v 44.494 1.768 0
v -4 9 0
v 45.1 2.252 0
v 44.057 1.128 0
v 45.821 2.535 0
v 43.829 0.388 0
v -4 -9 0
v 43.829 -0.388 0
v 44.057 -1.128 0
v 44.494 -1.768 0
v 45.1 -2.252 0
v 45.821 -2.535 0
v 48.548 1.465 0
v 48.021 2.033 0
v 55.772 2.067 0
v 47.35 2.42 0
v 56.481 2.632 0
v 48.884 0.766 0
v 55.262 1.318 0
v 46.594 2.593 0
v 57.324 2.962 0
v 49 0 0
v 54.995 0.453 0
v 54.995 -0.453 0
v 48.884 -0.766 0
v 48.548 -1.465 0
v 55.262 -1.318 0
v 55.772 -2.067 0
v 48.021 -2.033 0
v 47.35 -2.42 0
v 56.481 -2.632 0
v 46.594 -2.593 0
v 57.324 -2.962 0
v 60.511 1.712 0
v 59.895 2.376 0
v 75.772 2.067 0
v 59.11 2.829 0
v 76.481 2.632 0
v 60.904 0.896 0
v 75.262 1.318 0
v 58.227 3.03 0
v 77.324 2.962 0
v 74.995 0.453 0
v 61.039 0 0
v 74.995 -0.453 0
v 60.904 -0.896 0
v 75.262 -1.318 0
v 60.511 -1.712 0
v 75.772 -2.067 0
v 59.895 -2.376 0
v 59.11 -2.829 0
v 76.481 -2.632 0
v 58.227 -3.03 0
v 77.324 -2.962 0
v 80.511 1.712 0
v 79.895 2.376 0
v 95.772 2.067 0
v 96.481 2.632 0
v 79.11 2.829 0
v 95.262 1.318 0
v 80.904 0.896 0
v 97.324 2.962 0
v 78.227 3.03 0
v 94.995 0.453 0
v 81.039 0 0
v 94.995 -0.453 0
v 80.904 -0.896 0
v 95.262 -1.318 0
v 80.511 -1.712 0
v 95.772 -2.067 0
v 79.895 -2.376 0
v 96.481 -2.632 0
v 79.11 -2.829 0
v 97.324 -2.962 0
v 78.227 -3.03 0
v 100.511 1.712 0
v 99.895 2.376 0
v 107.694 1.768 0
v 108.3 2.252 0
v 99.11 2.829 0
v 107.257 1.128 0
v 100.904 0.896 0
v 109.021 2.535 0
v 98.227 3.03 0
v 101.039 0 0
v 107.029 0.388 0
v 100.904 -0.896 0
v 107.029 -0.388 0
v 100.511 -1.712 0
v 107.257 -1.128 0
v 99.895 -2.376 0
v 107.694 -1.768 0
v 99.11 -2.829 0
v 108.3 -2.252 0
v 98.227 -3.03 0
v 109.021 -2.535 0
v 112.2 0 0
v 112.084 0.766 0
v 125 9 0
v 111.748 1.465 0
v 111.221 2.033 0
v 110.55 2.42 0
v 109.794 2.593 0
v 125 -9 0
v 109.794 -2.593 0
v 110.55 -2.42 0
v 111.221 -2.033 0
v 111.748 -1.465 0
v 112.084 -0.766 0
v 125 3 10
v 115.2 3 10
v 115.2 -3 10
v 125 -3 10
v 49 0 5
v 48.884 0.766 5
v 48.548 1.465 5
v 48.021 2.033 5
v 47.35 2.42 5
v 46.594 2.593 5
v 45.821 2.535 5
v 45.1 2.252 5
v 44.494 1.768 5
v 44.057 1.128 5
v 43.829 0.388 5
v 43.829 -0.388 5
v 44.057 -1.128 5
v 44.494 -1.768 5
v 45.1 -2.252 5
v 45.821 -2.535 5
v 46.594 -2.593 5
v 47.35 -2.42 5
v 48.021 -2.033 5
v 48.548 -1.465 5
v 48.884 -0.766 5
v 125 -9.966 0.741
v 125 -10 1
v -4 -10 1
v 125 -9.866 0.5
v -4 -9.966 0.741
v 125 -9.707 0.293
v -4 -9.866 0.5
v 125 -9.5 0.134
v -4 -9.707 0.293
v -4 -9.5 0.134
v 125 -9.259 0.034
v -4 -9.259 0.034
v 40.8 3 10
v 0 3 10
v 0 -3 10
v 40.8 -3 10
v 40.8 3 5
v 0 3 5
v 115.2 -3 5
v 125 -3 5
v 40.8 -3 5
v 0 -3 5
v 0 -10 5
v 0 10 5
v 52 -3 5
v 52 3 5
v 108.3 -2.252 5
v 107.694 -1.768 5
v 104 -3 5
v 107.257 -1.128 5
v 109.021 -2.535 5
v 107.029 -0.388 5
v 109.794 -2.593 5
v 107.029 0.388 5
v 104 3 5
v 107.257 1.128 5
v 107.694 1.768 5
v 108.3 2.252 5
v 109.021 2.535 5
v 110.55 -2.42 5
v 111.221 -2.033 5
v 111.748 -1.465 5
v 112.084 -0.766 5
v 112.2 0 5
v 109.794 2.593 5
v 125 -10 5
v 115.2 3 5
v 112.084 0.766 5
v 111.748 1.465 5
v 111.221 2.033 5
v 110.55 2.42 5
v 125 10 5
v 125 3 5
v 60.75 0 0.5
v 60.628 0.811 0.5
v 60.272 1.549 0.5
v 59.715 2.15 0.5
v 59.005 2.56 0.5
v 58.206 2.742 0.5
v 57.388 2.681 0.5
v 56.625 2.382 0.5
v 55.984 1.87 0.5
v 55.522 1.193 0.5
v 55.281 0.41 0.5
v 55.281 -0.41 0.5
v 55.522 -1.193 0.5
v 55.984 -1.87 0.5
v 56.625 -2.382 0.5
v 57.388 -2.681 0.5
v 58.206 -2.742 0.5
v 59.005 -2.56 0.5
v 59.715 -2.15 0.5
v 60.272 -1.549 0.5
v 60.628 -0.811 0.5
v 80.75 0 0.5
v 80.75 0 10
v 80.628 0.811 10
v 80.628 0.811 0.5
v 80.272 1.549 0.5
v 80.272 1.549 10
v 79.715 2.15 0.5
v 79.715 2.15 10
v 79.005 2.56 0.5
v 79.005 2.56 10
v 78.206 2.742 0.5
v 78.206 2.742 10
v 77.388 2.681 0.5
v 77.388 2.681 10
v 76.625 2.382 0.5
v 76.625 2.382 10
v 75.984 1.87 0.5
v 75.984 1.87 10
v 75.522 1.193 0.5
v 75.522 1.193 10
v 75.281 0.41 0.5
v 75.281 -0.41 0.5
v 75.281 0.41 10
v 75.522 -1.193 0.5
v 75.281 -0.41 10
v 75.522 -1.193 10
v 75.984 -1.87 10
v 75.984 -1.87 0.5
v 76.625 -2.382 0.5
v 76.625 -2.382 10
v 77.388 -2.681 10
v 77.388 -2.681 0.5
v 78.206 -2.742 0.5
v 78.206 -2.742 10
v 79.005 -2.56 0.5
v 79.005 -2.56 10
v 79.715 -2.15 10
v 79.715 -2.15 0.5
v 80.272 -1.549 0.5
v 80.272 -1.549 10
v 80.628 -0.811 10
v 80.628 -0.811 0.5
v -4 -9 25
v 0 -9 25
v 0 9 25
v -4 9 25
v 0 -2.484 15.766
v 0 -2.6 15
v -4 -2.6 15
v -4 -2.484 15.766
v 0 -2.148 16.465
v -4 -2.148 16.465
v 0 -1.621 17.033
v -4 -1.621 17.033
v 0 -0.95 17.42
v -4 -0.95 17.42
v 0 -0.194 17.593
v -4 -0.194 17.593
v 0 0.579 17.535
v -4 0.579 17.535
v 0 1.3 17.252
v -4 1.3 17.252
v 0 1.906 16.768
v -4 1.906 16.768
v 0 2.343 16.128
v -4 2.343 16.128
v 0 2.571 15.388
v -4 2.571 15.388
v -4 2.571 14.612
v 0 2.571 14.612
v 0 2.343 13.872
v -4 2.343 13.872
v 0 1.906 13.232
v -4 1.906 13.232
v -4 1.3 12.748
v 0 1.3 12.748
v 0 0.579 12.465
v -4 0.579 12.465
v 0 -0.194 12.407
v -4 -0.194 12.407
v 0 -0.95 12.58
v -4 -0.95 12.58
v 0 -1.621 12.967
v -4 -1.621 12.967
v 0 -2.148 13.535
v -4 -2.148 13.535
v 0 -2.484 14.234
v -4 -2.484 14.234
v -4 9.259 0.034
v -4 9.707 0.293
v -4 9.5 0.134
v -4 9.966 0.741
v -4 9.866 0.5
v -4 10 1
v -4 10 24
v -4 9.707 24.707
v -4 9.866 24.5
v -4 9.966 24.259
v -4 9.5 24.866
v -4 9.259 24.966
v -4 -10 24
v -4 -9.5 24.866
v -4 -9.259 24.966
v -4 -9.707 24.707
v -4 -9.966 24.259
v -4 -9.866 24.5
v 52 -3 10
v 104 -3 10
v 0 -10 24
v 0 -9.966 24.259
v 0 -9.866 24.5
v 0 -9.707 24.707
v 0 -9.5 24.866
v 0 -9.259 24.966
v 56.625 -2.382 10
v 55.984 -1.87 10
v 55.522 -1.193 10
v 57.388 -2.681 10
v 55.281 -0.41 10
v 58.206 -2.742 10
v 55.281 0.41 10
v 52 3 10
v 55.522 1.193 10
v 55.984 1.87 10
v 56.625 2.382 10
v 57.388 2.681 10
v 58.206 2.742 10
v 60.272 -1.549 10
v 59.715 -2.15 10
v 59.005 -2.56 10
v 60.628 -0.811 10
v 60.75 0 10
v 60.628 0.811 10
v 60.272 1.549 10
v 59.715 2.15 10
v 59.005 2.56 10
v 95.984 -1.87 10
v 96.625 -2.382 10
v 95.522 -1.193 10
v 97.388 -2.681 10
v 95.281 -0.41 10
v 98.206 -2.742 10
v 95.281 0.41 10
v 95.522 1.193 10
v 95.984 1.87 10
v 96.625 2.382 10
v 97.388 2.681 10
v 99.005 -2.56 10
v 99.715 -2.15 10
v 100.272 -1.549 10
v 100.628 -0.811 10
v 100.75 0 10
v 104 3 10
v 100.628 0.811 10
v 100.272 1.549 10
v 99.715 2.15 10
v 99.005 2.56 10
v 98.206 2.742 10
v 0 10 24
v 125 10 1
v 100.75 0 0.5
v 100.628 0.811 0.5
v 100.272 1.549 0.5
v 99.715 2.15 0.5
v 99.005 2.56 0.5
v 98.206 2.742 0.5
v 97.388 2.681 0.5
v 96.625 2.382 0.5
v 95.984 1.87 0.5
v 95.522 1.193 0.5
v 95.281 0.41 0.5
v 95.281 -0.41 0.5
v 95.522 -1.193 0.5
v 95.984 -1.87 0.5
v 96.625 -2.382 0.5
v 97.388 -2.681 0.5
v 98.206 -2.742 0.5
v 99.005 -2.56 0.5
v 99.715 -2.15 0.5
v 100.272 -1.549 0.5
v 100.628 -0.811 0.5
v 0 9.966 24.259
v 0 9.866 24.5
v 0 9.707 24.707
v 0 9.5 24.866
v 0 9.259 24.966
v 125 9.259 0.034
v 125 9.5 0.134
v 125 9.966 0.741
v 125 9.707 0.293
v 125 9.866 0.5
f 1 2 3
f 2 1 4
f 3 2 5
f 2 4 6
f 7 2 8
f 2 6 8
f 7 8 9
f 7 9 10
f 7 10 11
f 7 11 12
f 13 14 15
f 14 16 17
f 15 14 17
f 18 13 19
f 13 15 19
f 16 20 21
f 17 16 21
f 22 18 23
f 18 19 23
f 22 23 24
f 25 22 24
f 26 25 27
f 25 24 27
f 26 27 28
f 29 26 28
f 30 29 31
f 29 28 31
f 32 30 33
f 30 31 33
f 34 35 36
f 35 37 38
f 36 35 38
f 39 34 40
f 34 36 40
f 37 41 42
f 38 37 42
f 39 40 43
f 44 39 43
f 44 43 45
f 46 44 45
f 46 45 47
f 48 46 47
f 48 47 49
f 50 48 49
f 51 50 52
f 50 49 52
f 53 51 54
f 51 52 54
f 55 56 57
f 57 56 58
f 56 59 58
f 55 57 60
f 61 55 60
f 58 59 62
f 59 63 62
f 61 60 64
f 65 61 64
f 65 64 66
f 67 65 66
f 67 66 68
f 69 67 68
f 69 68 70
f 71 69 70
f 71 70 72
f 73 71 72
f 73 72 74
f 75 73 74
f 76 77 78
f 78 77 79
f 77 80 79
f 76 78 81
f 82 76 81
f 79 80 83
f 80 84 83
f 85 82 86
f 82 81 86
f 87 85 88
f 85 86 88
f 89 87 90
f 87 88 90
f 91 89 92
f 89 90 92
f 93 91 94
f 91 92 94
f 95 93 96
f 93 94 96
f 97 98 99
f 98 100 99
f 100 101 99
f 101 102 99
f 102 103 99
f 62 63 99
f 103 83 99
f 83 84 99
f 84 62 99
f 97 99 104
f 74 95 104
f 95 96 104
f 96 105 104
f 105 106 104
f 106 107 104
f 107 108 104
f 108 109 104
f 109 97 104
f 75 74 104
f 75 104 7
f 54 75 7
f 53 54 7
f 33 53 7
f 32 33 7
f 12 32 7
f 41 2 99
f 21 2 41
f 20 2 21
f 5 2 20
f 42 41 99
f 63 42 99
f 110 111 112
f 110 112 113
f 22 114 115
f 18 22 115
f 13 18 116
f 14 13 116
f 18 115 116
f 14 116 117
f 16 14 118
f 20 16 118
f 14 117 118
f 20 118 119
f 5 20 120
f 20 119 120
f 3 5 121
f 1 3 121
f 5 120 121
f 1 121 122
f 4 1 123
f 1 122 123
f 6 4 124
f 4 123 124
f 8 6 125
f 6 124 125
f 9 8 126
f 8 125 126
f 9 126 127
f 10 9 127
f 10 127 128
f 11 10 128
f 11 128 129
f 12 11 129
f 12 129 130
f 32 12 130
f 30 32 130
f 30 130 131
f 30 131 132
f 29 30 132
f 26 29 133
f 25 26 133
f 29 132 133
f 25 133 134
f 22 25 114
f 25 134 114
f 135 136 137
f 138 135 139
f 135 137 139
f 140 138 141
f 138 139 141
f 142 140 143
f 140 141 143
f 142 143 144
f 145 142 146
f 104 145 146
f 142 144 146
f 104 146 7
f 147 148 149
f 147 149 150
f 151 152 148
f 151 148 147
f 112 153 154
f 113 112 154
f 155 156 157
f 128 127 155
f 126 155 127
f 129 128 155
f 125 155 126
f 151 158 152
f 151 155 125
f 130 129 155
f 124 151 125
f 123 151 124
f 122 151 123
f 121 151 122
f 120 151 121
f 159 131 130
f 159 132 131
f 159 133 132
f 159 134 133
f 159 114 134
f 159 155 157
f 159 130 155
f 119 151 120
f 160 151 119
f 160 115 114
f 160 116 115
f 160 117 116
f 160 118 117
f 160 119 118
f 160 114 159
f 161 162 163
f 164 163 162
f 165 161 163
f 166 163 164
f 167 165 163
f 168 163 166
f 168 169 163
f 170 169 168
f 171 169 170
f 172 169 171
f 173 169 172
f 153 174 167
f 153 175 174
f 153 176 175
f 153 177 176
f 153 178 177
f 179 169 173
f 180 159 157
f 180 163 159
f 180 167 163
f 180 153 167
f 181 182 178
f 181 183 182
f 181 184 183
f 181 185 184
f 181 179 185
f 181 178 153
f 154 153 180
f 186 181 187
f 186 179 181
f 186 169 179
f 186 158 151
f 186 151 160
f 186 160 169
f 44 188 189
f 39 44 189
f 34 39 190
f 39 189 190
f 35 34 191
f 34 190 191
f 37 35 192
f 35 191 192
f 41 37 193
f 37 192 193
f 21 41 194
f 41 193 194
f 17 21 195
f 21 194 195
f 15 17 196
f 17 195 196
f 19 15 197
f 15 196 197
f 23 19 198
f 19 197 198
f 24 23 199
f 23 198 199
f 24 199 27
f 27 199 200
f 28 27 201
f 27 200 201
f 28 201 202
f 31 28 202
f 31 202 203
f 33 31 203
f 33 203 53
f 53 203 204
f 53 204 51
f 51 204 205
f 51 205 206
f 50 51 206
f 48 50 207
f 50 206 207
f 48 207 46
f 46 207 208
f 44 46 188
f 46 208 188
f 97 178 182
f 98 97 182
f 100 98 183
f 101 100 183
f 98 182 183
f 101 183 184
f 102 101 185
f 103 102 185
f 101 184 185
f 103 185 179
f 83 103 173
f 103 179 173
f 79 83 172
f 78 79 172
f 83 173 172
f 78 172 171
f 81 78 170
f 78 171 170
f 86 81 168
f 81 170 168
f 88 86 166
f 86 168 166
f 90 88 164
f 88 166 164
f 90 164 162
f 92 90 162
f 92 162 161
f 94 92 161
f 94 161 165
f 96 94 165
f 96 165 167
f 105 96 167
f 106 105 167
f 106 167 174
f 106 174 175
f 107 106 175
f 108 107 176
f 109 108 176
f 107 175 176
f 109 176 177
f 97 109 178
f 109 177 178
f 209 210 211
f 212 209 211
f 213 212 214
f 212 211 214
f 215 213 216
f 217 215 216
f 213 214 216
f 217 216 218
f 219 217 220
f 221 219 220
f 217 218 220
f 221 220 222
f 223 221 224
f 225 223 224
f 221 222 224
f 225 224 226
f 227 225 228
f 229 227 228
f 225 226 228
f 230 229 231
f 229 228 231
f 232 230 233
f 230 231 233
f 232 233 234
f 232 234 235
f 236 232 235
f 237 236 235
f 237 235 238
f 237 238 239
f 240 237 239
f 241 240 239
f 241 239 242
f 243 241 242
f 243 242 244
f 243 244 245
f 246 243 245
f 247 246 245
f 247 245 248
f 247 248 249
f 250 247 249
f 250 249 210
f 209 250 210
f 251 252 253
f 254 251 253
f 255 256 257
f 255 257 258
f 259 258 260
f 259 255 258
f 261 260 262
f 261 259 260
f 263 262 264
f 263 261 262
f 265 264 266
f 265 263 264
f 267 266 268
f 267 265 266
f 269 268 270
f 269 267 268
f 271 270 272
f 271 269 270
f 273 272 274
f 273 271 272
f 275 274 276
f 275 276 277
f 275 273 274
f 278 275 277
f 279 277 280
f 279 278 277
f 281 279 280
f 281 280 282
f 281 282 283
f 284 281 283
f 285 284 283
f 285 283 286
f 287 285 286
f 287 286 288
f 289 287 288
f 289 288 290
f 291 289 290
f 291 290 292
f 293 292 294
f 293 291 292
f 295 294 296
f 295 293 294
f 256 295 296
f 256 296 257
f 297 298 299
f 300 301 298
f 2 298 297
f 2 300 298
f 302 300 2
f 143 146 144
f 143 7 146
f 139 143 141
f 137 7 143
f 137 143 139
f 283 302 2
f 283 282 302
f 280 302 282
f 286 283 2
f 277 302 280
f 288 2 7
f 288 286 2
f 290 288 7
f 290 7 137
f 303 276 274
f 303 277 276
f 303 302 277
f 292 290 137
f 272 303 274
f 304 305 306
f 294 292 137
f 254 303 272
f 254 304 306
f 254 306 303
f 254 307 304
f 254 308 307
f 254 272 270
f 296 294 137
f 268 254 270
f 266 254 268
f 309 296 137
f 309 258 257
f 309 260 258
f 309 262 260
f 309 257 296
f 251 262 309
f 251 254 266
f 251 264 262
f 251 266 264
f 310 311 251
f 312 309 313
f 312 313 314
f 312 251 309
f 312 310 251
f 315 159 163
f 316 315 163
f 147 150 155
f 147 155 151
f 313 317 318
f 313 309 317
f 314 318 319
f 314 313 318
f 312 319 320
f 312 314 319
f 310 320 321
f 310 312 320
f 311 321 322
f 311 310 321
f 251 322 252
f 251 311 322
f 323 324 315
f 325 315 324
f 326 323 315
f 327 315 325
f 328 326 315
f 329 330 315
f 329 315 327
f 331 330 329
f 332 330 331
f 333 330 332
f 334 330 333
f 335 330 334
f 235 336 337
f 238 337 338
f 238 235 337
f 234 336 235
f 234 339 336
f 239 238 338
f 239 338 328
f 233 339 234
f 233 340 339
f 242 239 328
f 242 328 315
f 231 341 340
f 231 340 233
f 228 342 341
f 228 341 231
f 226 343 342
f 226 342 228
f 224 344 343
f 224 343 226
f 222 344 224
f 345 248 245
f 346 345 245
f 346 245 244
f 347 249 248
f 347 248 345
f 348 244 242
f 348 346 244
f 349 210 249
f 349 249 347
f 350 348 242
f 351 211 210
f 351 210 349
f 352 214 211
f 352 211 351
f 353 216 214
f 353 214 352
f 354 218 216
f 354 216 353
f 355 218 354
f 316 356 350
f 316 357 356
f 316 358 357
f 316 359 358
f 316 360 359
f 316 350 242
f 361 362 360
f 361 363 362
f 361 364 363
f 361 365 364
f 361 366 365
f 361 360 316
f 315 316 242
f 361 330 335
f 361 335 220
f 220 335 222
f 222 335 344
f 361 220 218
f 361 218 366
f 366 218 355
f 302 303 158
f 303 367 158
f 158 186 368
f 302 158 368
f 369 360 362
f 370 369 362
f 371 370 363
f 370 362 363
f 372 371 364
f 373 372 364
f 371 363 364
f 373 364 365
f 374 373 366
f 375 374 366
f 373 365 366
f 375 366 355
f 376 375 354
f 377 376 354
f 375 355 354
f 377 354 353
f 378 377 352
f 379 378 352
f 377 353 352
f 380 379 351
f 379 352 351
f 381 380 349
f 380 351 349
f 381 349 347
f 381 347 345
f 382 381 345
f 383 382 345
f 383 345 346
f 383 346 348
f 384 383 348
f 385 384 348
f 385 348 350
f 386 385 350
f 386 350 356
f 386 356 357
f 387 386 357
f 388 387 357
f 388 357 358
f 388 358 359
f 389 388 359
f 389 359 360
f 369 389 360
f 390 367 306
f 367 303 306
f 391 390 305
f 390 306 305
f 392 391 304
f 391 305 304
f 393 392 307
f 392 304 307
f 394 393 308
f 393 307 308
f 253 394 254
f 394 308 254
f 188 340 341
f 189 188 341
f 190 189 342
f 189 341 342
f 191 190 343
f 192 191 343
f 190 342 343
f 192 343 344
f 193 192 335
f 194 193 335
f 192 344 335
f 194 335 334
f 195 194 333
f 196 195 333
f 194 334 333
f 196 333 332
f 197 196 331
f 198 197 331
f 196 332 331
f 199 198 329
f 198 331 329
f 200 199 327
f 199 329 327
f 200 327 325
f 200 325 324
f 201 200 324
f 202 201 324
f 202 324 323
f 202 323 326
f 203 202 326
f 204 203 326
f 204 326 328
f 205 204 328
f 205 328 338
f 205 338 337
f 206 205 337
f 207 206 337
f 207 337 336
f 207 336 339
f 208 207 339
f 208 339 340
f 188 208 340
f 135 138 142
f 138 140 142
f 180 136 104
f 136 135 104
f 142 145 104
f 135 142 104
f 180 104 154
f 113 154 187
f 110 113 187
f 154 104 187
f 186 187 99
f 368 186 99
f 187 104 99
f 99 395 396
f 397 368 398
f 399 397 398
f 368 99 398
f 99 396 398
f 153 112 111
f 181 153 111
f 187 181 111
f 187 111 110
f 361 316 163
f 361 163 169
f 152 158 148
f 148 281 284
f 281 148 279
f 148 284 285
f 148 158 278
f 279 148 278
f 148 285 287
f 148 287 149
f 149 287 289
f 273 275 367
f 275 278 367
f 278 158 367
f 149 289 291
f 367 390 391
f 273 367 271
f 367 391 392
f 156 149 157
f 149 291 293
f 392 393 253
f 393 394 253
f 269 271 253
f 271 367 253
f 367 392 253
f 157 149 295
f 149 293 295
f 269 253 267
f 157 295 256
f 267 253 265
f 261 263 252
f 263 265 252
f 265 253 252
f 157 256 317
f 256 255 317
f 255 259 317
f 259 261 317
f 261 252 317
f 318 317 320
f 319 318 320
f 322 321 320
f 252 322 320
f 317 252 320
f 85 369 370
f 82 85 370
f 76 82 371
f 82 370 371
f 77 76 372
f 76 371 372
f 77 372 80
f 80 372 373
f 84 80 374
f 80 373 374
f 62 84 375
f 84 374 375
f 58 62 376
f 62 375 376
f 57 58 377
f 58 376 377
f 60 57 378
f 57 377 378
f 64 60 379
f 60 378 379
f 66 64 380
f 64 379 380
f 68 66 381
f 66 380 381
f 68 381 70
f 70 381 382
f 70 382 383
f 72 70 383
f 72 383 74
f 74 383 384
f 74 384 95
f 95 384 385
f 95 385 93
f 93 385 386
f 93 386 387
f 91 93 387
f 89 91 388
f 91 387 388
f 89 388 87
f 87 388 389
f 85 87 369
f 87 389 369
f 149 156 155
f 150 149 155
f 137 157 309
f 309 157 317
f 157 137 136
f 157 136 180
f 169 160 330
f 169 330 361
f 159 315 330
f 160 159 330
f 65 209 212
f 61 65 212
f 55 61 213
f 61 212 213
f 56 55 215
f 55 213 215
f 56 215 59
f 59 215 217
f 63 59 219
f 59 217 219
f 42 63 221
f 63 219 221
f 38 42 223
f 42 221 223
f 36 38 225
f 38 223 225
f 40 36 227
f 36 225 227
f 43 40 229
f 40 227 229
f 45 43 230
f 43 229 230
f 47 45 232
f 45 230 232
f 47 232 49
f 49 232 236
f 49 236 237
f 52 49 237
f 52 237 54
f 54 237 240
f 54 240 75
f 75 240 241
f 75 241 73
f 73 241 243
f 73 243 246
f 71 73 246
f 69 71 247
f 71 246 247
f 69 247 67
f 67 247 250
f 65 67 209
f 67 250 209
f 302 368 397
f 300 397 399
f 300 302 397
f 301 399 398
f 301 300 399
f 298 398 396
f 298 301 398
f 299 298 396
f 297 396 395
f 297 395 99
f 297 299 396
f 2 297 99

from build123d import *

# Parameters (mm, degrees)
F0_W      = 125
F0_H      = 20
F1_DEPTH  = 5
F2_W      = 125
F2_H      = 6
F3_DEPTH  = 5
F4_R      = 2.75
F5_DEPTH  = 25
F6_W      = 11.2
F6_H      = 6
F7_DEPTH  = 5
F8_R      = 2.6
F9_DEPTH  = 5
F10_R     = 2.6
F11_DEPTH = 4
F12_R     = 1
F13_SIZE2 = 0.5
F13_SIZE  = 0.2886751346


with BuildPart() as f1:
    # F0 (on Top) → F1 (new body)
    with BuildSketch(Plane.XY):
        with Locations((62.5, 0)):
            Rectangle(F0_W, F0_H)
    extrude(amount=F1_DEPTH)

    # F2 (on face) → F3 (join)
    with BuildSketch(Plane.XY.offset(5)):
        with Locations((62.5, 0)):
            Rectangle(F2_W, F2_H)
    extrude(amount=F3_DEPTH)

    # F4 (on face) → F5 (cut)
    with BuildSketch(Plane.XY.offset(10)):
        with Locations((98, 0)):
            Circle(F4_R)
        with Locations((78, 0)):
            Circle(F4_R)
        with Locations((58, 0)):
            Circle(F4_R)
    extrude(amount=-F5_DEPTH, mode=Mode.SUBTRACT)

    # F6 (on face) → F7 (cut, through all)
    with BuildSketch(Plane.XY.offset(10)):
        with Locations((109.6, 0)):
            Rectangle(F6_W, F6_H)
        with Locations((46.4, 0)):
            Rectangle(F6_W, F6_H)
    extrude(amount=-F7_DEPTH, mode=Mode.SUBTRACT)

    # F8 (on face) → F9 (cut, through all)
    with BuildSketch(Plane.XY.offset(5)):
        with Locations((46.4, 0)):
            Circle(F8_R)
        with Locations((109.6, 0)):
            Circle(F8_R)
    extrude(amount=-F9_DEPTH, mode=Mode.SUBTRACT)

    # F10 (on face) → F11 (join)
    with BuildSketch(Plane(origin=(0, 0, 0), x_dir=(0, -1, 0), z_dir=(-1, 0, 0))):
        Polygon((-10, 25), (-10, 5), (-3, 5), (-3, 10), (3, 10), (3, 5), (10, 5), (10, 25), align=None)
        with Locations((0, 15)):
            Circle(F10_R, mode=Mode.SUBTRACT)
        Polygon((-10, 5), (-10, 0), (10, 0), (10, 5), (3, 5), (3, 10), (-3, 10), (-3, 5), align=None)
    extrude(amount=F11_DEPTH)

    # F12
    f12_edges = [f1.edges().sort_by_distance(p)[0] for p in [
        (-2, -10, 25),
        (-2, 10, 25),
        (60.5, -10, 0),
        (60.5, 10, 0),
    ]]
    fillet(f12_edges, radius=F12_R)

    # F13
    f13_edges = [f1.edges().sort_by_distance(p)[0] for p in [
        (55.25, 0, 0),
        (75.25, 0, 0),
        (95.25, 0, 0),
    ]]
    f13_side = f1.faces().sort_by_distance((-2.697502, 0, 0))[0]
    chamfer(f13_edges, length=F13_SIZE, length2=F13_SIZE2, reference=f13_side)


solid = f1.part
